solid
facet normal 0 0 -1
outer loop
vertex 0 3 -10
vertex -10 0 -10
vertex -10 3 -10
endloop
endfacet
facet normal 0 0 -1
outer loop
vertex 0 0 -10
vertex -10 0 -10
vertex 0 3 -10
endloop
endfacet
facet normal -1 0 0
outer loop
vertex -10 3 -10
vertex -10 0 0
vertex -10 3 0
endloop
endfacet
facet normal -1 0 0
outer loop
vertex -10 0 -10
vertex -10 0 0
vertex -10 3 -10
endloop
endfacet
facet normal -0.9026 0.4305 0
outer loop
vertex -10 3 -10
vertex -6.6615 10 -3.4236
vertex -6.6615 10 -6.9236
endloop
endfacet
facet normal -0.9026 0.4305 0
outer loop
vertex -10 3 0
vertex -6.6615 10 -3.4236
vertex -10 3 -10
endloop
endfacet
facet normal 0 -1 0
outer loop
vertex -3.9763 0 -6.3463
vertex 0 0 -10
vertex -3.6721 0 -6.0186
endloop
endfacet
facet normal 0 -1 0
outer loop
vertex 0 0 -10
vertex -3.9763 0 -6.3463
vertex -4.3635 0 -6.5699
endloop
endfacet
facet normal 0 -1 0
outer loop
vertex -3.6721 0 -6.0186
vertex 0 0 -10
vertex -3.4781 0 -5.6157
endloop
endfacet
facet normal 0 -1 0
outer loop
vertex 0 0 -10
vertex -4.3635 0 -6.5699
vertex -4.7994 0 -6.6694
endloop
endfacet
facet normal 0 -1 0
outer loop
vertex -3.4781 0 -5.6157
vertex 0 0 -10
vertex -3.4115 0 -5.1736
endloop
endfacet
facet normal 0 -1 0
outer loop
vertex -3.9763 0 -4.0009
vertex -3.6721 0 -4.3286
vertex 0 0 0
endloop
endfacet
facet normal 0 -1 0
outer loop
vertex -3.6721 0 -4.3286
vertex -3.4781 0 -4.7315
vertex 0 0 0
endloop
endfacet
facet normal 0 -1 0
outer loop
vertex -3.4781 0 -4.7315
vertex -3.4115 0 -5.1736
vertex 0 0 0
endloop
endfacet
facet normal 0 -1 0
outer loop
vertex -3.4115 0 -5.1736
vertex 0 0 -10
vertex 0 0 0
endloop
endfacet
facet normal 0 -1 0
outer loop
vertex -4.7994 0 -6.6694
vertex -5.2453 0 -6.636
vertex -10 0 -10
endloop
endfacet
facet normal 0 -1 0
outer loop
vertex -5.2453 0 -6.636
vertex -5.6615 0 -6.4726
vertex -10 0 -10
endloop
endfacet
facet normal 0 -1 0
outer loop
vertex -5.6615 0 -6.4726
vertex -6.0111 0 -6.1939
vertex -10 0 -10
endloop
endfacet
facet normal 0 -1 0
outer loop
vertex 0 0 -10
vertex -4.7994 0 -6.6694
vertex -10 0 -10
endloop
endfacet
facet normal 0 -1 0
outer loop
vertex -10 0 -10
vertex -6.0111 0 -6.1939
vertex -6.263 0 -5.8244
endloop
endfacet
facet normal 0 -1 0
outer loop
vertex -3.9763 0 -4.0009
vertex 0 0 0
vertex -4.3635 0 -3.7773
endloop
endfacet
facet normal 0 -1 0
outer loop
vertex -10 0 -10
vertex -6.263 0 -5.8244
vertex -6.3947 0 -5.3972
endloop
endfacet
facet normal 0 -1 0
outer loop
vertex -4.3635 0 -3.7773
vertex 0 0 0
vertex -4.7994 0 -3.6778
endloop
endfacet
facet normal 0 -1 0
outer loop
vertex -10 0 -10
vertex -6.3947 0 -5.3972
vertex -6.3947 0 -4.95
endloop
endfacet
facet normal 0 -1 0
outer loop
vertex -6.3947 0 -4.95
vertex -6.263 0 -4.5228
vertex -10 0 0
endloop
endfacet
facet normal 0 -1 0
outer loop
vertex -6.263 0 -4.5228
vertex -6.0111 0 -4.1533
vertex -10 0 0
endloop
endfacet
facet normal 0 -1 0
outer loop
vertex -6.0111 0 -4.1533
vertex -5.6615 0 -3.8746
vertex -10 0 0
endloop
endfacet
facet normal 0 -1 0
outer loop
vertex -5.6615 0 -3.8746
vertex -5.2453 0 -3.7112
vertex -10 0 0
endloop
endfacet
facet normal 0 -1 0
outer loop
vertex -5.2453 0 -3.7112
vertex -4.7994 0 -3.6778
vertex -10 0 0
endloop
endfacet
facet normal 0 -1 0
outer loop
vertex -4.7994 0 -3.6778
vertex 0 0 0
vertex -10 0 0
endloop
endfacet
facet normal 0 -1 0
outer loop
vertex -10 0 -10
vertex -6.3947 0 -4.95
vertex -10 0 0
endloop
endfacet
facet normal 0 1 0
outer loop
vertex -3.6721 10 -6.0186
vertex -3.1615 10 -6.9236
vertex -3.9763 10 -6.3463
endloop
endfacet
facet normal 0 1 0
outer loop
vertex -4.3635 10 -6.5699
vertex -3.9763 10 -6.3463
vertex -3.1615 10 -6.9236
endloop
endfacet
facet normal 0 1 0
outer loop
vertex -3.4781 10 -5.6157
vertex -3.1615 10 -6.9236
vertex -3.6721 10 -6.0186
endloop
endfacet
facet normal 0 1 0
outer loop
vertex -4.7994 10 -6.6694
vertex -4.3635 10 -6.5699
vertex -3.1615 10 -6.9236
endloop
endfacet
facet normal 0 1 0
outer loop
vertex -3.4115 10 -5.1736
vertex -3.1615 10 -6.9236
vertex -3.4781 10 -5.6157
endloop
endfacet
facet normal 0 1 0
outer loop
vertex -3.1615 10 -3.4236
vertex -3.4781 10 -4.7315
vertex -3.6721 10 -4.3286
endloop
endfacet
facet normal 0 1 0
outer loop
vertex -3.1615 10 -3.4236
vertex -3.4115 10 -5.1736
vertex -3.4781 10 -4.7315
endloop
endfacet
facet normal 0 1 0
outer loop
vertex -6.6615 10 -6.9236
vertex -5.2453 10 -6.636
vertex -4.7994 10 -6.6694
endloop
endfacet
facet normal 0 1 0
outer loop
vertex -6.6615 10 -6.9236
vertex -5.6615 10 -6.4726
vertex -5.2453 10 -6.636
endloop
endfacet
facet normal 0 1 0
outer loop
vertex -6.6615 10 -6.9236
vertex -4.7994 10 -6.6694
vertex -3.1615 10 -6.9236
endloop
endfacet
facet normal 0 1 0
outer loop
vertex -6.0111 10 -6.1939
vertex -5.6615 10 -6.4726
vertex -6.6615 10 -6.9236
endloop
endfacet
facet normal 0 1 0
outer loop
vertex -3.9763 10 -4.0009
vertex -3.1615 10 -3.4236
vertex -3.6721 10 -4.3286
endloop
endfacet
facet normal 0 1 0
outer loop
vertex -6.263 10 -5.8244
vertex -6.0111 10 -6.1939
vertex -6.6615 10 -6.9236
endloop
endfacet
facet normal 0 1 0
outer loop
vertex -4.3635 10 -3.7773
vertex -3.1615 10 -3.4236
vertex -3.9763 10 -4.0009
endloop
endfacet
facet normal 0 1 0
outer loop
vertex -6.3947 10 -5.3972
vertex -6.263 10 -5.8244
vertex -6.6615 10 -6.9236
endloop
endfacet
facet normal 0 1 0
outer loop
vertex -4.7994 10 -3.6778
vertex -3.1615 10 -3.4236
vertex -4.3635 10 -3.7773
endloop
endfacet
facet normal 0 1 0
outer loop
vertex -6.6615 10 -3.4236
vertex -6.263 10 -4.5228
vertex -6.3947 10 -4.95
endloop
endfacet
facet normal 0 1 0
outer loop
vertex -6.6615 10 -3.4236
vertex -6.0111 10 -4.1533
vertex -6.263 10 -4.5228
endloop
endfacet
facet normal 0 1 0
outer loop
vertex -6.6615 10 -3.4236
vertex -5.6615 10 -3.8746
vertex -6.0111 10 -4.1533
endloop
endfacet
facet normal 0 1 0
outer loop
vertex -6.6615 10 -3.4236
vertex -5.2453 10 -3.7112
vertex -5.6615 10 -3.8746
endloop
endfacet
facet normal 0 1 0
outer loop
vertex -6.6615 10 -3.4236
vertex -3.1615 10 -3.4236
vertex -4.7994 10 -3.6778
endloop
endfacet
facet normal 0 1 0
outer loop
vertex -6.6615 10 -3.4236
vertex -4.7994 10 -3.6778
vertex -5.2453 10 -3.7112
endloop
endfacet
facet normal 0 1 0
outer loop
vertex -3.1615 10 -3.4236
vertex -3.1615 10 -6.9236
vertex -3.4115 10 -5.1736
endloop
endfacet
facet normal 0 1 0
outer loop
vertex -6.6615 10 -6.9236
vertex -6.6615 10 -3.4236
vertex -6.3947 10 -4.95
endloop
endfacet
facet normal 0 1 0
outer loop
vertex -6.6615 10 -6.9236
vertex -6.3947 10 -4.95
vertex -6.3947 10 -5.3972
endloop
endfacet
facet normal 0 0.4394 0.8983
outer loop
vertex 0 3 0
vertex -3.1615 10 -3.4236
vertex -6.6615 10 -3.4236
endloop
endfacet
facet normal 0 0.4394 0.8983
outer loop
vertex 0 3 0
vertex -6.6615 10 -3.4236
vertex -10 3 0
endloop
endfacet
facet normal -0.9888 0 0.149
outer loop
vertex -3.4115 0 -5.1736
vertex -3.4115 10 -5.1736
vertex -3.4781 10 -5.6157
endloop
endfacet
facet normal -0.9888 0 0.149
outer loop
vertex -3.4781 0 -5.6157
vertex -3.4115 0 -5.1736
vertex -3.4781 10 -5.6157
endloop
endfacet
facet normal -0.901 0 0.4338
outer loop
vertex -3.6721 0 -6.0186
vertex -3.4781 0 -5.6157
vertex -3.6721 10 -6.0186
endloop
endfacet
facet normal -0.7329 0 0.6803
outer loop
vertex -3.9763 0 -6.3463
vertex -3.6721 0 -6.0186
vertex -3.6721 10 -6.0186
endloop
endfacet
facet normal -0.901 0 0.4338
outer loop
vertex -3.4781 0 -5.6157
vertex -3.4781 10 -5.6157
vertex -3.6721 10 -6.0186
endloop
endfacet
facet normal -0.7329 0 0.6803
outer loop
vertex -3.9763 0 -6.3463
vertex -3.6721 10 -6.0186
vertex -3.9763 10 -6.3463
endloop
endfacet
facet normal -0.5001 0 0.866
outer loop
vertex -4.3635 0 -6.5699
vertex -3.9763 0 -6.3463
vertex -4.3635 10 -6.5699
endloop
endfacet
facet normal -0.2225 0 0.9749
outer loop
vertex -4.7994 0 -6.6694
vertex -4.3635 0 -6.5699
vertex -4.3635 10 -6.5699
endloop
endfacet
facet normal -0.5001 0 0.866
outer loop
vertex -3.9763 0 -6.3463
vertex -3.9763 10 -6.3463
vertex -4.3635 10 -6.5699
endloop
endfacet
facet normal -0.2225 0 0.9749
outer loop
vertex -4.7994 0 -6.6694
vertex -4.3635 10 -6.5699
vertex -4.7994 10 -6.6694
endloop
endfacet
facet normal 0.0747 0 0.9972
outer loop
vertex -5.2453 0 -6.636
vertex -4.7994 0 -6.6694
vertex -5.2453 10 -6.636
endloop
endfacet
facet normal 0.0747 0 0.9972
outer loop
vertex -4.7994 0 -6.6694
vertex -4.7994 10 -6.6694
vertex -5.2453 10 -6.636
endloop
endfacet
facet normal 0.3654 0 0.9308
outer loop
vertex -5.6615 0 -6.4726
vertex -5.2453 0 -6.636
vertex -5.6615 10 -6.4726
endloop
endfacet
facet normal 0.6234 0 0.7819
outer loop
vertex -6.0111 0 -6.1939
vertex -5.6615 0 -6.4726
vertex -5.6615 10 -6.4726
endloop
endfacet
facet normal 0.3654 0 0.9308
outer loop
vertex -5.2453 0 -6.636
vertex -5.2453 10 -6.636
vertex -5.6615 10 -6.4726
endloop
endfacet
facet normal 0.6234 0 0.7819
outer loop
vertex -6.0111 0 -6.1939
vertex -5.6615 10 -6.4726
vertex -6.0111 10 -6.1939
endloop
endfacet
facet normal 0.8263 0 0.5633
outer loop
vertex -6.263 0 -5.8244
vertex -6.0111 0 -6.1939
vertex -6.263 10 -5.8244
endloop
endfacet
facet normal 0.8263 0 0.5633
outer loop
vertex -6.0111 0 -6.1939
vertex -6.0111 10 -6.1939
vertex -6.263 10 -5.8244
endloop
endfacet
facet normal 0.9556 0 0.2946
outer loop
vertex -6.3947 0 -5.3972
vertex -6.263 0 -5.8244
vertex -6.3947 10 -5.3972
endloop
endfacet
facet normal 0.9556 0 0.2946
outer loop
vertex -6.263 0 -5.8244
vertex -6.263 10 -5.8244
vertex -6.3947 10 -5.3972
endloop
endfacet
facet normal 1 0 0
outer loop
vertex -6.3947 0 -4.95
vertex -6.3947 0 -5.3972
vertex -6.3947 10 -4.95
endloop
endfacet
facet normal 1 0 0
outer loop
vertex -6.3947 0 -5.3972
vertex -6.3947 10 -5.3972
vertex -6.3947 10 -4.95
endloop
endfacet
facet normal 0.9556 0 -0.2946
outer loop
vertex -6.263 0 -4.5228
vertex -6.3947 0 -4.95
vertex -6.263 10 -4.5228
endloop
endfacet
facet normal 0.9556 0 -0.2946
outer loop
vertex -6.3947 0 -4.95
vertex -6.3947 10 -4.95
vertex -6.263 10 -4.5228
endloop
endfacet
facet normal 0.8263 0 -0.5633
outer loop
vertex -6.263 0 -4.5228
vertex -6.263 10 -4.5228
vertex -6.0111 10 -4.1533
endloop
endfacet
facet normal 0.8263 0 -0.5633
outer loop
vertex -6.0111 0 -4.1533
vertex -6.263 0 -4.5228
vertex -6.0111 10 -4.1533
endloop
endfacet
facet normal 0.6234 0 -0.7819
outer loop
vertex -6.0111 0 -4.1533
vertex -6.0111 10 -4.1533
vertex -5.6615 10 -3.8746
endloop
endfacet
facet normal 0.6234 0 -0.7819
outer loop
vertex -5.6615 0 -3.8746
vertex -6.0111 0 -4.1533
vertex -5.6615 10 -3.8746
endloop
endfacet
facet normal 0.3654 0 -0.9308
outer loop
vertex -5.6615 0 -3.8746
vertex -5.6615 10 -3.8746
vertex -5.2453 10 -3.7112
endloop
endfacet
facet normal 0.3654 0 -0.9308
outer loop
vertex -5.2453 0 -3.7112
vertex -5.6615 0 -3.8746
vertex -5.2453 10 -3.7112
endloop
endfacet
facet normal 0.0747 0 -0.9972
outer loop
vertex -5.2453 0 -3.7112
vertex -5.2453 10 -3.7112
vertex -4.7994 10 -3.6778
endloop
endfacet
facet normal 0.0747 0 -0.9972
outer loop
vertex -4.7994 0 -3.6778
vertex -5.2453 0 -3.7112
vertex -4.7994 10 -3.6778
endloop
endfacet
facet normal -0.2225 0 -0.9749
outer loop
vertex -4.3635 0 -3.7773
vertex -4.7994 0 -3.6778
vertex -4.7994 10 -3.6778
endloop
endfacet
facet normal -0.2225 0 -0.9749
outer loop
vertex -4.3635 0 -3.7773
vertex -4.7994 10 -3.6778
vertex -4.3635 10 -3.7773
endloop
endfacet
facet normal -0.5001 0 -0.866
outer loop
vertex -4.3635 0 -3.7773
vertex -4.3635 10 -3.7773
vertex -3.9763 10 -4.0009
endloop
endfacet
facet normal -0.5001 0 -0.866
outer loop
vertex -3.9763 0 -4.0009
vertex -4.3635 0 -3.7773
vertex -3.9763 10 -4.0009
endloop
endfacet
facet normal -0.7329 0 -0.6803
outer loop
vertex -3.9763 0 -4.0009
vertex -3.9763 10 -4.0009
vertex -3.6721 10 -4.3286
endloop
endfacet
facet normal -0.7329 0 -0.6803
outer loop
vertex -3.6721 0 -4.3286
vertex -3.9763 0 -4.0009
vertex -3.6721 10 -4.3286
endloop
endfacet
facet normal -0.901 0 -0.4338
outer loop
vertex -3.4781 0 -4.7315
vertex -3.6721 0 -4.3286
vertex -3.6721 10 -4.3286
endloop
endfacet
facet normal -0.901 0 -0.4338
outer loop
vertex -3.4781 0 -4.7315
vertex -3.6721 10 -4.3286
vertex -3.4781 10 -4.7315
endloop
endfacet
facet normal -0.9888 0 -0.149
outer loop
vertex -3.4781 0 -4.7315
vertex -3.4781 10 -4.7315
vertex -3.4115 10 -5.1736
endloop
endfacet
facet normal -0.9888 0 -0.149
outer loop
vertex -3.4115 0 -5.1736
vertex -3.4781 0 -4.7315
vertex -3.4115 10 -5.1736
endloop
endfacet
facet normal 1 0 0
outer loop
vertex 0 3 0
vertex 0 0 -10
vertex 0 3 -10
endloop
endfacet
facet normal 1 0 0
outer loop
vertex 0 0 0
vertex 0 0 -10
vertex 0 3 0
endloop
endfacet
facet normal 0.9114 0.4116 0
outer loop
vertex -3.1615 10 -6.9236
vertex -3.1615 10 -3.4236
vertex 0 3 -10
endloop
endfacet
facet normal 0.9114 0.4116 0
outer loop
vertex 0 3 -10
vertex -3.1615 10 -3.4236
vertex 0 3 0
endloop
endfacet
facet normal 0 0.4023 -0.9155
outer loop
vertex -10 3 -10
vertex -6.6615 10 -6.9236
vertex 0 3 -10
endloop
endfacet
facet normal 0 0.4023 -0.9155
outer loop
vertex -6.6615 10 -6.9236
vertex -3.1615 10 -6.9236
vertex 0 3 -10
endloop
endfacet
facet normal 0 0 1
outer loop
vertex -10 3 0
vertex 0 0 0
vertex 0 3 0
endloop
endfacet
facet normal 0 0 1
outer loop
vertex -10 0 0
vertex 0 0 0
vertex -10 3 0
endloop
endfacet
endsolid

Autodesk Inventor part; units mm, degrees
ref_plane "YZ Plane" through (0, 0, 0) normal (1, 0, 0) x (0, 1, 0)
ref_plane "XZ Plane" through (0, 0, 0) normal (0, 1, 0) x (-1, 0, 0)
ref_plane "XY Plane" through (0, 0, 0) normal (0, 0, 1) x (1, 0, 0)
sketch "Sketch3" plane through (0, 0, 0) normal (0, 1, 0) x (-1, 0, 0)
  line L0 (10, 0) -> (10, -10)
  line L1 (10, -10) -> (0, -10)
  line L2 (0, -10) -> (0, 0)
  line L3 (0, 0) -> (10, 0)
  dimension "d0" = 10
  dimension "d1" = 10
extrude "Extrusion1" add sketch "Sketch3" along normal blind 10
sketch "Sketch4" plane through (0, 0, 0) normal (1, 0, 0) x (0, 0, -1)
  line L0 (10, 10) -> (0, 10) projected
  line L1 (3.4236, 10) -> (0, 3)
  line L2 (0, 0) -> (0, 10) projected
  line L3 (6.9236, 10) -> (10, 3)
  line L4 (10, 0) -> (10, 10) projected
  line L5 (3.4236, 10) -> (6.9236, 10)
  dimension "d4" = 3.5
  dimension "d5" = 7
  dimension "d6" = 7
extrude "Extrusion2" cut sketch "Sketch4" against normal blind 10
sketch "Sketch6" plane through (-10, 0, 0) normal (0, 0, 1) x (1, 0, 0)
  line L0 (0, 10) -> (10, 10) projected
  line L1 (3.3385, 10) -> (0, 3)
  line L2 (0, 3) -> (0, 10) projected
  line L3 (3.3385, 10) -> (6.8385, 10)
  line L4 (6.8385, 10) -> (10, 3)
  line L5 (10, 10) -> (10, 3) projected
  point P0 (10, 0)
  dimension "d12" = 3.5
  dimension "d13" = 7
  dimension "d14" = 7
extrude "Extrusion3" cut sketch "Sketch6" against normal blind 10
sketch "Sketch7" plane through (0, 10, 0) normal (0, 1, 0) x (1, 0, 0)
  circle A0 centre (-4.9115, 5.1736) radius 1.5
  line L0 (-6.6615, 3.4236) -> (-3.1615, 3.4236) projected
  point P0 (0, 0)
  dimension "d17" = 1.75
  dimension "d18" = 3
extrude "Extrusion4" cut sketch "Sketch7" against normal blind 10
properties part number "Stand"
